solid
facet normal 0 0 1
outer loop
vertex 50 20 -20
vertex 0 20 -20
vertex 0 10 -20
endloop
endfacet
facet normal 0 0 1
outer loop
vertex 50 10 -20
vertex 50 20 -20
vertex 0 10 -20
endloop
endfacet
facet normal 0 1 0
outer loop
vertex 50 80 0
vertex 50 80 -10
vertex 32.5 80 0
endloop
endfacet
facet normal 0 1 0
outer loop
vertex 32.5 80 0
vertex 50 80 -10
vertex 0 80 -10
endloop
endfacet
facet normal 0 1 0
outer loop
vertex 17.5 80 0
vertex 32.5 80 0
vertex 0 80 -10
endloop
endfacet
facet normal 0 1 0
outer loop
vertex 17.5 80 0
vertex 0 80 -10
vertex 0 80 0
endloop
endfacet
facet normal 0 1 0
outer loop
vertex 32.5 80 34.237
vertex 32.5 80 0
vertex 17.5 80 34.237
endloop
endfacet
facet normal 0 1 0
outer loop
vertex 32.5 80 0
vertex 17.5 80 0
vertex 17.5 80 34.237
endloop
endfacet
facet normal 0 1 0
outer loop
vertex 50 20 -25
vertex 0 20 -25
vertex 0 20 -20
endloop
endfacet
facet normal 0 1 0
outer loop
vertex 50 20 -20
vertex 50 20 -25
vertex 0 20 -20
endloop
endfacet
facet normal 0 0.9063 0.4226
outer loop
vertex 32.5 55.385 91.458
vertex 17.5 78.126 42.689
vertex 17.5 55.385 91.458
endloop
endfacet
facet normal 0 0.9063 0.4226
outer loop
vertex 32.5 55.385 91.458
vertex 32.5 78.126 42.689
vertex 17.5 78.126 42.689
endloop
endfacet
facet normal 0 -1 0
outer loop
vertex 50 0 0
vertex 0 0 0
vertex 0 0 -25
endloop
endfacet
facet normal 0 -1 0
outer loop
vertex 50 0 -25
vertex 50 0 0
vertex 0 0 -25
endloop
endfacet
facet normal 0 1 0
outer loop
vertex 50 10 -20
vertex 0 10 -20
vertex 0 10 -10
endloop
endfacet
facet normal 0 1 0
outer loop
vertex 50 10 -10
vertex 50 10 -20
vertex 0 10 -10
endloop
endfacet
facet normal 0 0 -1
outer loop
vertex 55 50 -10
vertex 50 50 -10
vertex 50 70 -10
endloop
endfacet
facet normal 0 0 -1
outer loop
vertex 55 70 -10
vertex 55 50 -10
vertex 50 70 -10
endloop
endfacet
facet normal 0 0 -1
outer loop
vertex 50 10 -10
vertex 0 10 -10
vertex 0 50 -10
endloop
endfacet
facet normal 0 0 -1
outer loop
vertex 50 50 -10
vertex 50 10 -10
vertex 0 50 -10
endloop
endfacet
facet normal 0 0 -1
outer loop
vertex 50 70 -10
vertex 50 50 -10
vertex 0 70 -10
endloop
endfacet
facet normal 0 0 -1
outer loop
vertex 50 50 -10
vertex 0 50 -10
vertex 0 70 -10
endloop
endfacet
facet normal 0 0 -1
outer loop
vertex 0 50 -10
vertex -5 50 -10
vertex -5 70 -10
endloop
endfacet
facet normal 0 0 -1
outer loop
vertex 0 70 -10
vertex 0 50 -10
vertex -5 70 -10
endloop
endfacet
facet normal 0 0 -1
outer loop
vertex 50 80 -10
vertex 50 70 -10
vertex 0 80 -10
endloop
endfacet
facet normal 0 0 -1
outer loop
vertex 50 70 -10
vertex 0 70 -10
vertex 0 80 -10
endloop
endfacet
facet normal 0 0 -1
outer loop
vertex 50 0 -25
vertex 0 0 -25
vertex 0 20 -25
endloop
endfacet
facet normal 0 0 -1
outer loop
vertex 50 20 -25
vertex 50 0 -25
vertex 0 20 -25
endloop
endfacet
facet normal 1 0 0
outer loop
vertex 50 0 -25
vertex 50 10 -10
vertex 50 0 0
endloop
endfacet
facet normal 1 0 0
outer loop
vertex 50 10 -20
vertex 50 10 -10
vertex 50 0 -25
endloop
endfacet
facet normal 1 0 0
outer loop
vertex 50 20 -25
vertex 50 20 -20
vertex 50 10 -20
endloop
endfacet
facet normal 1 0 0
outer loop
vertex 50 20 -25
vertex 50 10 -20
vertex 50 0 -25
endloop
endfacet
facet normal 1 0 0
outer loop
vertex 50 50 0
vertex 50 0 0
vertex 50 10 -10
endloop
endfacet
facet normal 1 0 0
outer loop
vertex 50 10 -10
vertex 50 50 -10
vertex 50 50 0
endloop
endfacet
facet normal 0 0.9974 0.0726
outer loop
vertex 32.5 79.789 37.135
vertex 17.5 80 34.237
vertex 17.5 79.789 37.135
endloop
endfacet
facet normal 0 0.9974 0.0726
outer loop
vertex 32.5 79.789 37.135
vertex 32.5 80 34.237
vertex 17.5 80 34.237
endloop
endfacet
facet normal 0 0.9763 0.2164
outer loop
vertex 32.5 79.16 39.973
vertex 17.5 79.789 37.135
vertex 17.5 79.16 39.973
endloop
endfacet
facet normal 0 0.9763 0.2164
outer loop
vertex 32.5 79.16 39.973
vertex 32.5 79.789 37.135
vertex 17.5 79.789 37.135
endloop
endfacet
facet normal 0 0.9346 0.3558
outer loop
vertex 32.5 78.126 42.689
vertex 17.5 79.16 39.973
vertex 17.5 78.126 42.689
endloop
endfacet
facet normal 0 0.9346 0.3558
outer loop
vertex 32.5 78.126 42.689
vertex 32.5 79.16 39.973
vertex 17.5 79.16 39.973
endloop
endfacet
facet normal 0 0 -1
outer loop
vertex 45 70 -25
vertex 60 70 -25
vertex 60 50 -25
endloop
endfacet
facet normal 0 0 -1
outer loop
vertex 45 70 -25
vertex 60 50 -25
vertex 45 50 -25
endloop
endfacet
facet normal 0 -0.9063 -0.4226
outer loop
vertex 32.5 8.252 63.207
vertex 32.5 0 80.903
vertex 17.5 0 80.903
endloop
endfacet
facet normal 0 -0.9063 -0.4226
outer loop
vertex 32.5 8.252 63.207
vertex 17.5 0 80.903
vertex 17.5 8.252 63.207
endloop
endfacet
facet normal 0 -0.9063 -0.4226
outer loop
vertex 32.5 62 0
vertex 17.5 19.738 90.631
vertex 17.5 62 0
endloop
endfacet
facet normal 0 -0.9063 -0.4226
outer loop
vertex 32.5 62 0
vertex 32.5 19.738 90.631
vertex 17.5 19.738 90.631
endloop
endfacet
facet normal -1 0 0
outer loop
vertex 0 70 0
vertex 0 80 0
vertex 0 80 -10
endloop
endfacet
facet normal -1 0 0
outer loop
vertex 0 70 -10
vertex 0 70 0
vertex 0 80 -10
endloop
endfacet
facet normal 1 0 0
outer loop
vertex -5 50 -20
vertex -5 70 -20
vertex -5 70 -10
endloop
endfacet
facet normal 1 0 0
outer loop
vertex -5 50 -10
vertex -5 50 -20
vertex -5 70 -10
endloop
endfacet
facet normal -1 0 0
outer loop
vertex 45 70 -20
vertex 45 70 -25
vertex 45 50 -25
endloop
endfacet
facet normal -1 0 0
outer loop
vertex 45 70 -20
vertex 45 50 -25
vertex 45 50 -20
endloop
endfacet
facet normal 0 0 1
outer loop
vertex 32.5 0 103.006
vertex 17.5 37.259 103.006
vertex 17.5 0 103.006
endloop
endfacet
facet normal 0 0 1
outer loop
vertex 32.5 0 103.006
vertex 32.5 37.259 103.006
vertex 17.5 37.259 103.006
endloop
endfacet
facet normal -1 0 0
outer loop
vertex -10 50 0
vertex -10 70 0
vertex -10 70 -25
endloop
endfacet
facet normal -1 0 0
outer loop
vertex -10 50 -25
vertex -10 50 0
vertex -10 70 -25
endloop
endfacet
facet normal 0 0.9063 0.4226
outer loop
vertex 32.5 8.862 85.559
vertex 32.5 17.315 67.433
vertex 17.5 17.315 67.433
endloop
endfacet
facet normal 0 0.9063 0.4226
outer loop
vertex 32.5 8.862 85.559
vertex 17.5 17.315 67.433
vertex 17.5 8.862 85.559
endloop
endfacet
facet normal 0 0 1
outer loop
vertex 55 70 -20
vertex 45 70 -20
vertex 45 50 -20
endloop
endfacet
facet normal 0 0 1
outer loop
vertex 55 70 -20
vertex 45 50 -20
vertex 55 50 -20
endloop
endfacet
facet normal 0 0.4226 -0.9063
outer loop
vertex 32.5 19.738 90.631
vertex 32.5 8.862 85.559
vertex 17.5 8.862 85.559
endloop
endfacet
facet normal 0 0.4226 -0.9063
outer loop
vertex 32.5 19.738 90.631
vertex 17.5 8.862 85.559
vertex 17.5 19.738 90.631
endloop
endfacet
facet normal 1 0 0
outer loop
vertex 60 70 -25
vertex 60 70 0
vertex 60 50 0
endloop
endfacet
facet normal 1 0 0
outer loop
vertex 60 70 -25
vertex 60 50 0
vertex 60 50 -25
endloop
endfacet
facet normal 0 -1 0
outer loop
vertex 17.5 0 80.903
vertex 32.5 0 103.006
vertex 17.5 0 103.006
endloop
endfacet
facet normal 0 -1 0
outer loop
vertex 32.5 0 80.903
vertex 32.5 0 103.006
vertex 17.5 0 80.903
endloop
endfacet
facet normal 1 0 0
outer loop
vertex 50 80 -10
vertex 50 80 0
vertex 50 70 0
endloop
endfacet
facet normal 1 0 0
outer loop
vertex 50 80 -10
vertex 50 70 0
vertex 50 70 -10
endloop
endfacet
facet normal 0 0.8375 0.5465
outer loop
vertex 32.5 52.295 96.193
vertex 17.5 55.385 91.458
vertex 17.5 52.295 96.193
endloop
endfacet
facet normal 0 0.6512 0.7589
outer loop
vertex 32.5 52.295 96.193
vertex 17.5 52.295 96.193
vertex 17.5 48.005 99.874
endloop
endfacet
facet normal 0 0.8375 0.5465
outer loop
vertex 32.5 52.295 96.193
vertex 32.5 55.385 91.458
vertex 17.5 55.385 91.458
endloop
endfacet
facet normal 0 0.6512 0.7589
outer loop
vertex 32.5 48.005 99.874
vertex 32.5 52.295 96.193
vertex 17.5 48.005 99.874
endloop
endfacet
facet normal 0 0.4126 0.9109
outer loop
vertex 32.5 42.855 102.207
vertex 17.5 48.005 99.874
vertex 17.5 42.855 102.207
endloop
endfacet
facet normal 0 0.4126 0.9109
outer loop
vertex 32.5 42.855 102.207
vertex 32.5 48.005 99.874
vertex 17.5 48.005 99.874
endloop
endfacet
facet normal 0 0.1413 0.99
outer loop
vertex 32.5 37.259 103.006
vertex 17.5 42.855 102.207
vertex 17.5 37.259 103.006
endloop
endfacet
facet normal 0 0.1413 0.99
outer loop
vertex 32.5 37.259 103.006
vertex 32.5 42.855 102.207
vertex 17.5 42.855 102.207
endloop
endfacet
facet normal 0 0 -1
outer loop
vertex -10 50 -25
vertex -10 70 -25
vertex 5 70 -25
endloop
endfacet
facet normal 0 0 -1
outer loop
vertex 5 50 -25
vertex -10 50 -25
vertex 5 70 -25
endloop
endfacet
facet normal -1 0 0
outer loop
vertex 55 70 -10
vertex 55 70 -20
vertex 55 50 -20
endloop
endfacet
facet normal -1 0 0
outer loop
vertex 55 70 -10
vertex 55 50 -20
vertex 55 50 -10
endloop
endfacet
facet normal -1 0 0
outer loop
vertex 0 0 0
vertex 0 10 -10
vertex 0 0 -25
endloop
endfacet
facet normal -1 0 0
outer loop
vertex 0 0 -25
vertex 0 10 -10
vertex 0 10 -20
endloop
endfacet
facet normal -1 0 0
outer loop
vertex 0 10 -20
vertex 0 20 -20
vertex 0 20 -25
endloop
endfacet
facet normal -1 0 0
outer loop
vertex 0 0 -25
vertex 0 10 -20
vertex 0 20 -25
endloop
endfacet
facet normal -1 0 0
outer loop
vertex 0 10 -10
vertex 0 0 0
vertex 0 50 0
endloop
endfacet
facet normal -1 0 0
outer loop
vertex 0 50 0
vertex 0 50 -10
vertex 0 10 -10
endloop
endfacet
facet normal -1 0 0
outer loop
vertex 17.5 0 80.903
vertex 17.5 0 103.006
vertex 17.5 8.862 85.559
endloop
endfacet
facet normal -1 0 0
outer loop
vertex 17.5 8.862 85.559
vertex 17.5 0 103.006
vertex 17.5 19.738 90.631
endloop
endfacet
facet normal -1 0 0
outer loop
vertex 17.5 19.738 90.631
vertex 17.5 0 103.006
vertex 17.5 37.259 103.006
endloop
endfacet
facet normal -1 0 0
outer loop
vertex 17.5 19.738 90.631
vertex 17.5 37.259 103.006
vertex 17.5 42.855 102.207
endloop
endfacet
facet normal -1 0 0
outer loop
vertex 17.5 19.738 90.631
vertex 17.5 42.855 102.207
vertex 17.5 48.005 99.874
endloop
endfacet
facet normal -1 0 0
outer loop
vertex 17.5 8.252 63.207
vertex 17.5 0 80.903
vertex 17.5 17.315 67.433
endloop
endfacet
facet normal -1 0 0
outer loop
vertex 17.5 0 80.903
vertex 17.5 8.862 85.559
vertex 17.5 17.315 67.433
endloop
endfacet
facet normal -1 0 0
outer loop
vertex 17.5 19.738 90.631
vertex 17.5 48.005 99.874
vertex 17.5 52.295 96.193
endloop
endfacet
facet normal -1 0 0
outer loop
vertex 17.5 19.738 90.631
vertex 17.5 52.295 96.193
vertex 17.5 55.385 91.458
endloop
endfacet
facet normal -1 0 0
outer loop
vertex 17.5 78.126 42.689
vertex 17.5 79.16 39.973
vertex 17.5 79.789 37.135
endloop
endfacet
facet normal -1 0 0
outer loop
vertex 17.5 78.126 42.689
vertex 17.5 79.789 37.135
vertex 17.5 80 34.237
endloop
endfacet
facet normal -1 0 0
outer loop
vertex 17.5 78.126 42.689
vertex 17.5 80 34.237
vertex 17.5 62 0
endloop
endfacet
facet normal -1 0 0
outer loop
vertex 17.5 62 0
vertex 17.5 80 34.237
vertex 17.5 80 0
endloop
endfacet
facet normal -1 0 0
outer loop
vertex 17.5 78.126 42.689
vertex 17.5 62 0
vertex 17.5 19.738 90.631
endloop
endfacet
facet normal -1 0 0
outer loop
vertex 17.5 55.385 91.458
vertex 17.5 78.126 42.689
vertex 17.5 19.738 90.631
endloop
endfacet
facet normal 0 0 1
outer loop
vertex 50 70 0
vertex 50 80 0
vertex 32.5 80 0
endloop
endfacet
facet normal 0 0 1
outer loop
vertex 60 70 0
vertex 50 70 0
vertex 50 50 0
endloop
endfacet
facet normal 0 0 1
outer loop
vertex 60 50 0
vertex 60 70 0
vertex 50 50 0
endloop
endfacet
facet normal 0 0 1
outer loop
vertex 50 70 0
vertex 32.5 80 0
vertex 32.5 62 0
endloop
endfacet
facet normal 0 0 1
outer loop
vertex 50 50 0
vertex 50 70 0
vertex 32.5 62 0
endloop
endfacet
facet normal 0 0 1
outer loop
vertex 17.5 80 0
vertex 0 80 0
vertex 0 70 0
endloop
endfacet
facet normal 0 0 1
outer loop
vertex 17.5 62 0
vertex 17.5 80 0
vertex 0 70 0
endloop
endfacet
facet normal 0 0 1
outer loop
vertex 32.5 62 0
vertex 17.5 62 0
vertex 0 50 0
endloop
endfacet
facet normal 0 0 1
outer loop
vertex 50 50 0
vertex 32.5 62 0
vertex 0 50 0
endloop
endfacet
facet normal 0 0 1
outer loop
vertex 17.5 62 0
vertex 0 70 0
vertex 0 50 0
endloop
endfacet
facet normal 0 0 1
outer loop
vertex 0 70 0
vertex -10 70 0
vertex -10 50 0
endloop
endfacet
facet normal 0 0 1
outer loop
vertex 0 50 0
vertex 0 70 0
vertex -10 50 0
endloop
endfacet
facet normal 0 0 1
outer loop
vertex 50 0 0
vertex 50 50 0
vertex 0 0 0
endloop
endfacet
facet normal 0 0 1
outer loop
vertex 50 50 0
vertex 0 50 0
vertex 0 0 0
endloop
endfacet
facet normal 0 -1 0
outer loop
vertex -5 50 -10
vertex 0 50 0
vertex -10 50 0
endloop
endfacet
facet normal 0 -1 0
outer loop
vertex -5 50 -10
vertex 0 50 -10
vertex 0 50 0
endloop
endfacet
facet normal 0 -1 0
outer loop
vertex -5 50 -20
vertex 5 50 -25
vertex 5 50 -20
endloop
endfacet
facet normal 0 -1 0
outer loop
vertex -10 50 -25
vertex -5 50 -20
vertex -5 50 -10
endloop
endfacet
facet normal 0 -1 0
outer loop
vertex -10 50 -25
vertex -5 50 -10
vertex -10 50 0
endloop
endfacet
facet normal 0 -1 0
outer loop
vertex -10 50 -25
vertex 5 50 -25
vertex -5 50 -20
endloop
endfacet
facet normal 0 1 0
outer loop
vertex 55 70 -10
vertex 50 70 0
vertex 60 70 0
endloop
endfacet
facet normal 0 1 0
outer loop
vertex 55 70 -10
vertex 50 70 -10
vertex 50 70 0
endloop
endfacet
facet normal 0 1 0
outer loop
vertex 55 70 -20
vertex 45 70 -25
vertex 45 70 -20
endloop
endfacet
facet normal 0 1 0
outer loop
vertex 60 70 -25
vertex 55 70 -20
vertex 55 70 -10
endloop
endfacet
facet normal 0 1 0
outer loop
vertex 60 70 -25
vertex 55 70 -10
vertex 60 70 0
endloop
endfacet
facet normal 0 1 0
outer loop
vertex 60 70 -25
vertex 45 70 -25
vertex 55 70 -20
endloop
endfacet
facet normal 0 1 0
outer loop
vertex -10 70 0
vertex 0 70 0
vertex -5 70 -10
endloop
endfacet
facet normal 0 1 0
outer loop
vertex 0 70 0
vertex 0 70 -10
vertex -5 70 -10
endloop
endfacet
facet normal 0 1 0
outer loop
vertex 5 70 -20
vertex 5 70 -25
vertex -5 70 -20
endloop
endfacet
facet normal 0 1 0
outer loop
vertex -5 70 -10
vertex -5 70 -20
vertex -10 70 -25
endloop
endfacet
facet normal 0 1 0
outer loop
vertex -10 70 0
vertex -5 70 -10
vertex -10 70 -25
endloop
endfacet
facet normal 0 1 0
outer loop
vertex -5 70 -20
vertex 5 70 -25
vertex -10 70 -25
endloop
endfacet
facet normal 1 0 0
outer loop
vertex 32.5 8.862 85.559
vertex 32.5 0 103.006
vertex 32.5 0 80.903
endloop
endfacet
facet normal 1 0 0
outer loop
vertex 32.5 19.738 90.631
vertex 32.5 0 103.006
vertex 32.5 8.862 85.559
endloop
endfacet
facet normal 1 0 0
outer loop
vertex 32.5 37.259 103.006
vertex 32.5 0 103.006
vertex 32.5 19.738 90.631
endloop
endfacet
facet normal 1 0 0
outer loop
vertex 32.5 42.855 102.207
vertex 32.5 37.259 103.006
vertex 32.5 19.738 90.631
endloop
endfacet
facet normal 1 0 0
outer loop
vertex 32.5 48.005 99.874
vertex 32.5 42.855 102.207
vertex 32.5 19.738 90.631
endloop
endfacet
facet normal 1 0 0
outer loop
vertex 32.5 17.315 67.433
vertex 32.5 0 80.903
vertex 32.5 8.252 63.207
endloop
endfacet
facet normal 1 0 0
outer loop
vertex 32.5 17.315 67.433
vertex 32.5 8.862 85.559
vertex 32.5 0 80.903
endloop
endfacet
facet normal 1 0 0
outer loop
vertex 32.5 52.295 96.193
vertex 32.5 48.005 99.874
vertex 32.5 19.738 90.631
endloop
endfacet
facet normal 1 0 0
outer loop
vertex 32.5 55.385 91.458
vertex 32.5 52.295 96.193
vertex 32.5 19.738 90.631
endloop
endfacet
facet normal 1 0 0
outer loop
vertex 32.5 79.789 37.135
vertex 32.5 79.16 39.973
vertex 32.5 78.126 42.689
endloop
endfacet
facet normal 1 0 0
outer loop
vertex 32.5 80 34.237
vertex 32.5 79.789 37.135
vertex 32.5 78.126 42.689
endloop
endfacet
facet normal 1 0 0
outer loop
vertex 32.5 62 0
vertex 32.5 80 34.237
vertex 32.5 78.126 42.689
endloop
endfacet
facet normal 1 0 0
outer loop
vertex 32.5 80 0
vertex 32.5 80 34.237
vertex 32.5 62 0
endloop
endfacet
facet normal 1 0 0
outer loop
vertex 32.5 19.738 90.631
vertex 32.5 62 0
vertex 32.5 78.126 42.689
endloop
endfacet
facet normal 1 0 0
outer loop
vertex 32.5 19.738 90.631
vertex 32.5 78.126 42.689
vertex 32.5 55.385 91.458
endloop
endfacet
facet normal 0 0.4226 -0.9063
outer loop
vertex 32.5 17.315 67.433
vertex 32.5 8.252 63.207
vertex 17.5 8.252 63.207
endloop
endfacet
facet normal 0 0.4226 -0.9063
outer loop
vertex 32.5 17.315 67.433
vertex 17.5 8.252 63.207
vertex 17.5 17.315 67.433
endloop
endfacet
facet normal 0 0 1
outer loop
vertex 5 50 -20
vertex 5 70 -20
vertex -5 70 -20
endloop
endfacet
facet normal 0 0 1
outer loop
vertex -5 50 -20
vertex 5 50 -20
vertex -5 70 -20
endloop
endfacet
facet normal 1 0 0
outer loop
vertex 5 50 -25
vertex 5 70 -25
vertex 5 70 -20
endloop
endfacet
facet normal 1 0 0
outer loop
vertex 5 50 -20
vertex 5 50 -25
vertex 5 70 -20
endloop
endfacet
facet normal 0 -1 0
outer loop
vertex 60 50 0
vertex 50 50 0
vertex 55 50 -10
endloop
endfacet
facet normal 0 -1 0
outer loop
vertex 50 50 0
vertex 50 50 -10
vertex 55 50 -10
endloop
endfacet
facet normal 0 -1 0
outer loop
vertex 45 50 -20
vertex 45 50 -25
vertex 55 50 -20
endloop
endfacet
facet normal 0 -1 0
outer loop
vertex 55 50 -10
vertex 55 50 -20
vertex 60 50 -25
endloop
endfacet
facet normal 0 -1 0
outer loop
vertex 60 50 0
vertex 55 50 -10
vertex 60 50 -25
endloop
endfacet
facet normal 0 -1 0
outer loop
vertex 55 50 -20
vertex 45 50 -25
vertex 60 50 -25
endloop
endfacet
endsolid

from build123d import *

# Parameters (mm, degrees)
BOSS_EXTRUDE2_DEPTH = 50
BOSS_EXTRUDE3_DEPTH = 20
BOSS_EXTRUDE4_DEPTH = 7.5
FILLET2_R           = 20
FILLET3_R           = 20


with BuildPart() as part:
    # Sketch2 → Boss-Extrude2 (new body)
    with BuildSketch(Plane(origin=(0, 0, 0), x_dir=(0, 0, -1), z_dir=(1, 0, 0))):
        Polygon((0, 0), (25, 0), (25, 20), (20, 20), (20, 10), (10, 10), (10, 80), (0, 80), align=None)
    extrude(amount=BOSS_EXTRUDE2_DEPTH)

    # Sketch3 → Boss-Extrude3 (add)
    with BuildSketch(Plane(origin=(0, 70, 0), x_dir=(1, 0, 0), z_dir=(0, 1, 0))):
        Polygon((50, 0), (60, 0), (60, 25), (45, 25), (45, 20), (50, 20), (55, 20), (55, 10), (50, 10), align=None)
    boss_extrude3 = extrude(amount=-BOSS_EXTRUDE3_DEPTH)

    # Mirror1: Boss-Extrude3 across plane
    add(boss_extrude3.mirror(Plane(origin=(25, 0, 0), x_dir=(0, 0, 1), z_dir=(1, 0, 0))))

    # Sketch5 → Boss-Extrude4 (add, symmetric)
    with BuildSketch(Plane(origin=(25, 0, 0), x_dir=(0, 0, -1), z_dir=(1, 0, 0))):
        Polygon((0, 80), (-38.670604871, 80), (-103.005812487, 50), (-103.005812487, 0), (-80.902994242, 0), (-63.207021205, 8.251767746), (-67.433203822, 17.314845616), (-85.559359563, 8.862480381), (-90.630778704, 19.738173826), (0, 62), align=None)
    extrude(amount=BOSS_EXTRUDE4_DEPTH, both=True)

    # Fillet2
    fillet2_edges = [part.edges().sort_by_distance(p)[0] for p in [
        (25, 80, 38.670604871),
    ]]
    fillet(fillet2_edges, radius=FILLET2_R)

    # Fillet3
    fillet3_edges = [part.edges().sort_by_distance(p)[0] for p in [
        (25, 50, 103.005812487),
    ]]
    fillet(fillet3_edges, radius=FILLET3_R)


solid = part.part
